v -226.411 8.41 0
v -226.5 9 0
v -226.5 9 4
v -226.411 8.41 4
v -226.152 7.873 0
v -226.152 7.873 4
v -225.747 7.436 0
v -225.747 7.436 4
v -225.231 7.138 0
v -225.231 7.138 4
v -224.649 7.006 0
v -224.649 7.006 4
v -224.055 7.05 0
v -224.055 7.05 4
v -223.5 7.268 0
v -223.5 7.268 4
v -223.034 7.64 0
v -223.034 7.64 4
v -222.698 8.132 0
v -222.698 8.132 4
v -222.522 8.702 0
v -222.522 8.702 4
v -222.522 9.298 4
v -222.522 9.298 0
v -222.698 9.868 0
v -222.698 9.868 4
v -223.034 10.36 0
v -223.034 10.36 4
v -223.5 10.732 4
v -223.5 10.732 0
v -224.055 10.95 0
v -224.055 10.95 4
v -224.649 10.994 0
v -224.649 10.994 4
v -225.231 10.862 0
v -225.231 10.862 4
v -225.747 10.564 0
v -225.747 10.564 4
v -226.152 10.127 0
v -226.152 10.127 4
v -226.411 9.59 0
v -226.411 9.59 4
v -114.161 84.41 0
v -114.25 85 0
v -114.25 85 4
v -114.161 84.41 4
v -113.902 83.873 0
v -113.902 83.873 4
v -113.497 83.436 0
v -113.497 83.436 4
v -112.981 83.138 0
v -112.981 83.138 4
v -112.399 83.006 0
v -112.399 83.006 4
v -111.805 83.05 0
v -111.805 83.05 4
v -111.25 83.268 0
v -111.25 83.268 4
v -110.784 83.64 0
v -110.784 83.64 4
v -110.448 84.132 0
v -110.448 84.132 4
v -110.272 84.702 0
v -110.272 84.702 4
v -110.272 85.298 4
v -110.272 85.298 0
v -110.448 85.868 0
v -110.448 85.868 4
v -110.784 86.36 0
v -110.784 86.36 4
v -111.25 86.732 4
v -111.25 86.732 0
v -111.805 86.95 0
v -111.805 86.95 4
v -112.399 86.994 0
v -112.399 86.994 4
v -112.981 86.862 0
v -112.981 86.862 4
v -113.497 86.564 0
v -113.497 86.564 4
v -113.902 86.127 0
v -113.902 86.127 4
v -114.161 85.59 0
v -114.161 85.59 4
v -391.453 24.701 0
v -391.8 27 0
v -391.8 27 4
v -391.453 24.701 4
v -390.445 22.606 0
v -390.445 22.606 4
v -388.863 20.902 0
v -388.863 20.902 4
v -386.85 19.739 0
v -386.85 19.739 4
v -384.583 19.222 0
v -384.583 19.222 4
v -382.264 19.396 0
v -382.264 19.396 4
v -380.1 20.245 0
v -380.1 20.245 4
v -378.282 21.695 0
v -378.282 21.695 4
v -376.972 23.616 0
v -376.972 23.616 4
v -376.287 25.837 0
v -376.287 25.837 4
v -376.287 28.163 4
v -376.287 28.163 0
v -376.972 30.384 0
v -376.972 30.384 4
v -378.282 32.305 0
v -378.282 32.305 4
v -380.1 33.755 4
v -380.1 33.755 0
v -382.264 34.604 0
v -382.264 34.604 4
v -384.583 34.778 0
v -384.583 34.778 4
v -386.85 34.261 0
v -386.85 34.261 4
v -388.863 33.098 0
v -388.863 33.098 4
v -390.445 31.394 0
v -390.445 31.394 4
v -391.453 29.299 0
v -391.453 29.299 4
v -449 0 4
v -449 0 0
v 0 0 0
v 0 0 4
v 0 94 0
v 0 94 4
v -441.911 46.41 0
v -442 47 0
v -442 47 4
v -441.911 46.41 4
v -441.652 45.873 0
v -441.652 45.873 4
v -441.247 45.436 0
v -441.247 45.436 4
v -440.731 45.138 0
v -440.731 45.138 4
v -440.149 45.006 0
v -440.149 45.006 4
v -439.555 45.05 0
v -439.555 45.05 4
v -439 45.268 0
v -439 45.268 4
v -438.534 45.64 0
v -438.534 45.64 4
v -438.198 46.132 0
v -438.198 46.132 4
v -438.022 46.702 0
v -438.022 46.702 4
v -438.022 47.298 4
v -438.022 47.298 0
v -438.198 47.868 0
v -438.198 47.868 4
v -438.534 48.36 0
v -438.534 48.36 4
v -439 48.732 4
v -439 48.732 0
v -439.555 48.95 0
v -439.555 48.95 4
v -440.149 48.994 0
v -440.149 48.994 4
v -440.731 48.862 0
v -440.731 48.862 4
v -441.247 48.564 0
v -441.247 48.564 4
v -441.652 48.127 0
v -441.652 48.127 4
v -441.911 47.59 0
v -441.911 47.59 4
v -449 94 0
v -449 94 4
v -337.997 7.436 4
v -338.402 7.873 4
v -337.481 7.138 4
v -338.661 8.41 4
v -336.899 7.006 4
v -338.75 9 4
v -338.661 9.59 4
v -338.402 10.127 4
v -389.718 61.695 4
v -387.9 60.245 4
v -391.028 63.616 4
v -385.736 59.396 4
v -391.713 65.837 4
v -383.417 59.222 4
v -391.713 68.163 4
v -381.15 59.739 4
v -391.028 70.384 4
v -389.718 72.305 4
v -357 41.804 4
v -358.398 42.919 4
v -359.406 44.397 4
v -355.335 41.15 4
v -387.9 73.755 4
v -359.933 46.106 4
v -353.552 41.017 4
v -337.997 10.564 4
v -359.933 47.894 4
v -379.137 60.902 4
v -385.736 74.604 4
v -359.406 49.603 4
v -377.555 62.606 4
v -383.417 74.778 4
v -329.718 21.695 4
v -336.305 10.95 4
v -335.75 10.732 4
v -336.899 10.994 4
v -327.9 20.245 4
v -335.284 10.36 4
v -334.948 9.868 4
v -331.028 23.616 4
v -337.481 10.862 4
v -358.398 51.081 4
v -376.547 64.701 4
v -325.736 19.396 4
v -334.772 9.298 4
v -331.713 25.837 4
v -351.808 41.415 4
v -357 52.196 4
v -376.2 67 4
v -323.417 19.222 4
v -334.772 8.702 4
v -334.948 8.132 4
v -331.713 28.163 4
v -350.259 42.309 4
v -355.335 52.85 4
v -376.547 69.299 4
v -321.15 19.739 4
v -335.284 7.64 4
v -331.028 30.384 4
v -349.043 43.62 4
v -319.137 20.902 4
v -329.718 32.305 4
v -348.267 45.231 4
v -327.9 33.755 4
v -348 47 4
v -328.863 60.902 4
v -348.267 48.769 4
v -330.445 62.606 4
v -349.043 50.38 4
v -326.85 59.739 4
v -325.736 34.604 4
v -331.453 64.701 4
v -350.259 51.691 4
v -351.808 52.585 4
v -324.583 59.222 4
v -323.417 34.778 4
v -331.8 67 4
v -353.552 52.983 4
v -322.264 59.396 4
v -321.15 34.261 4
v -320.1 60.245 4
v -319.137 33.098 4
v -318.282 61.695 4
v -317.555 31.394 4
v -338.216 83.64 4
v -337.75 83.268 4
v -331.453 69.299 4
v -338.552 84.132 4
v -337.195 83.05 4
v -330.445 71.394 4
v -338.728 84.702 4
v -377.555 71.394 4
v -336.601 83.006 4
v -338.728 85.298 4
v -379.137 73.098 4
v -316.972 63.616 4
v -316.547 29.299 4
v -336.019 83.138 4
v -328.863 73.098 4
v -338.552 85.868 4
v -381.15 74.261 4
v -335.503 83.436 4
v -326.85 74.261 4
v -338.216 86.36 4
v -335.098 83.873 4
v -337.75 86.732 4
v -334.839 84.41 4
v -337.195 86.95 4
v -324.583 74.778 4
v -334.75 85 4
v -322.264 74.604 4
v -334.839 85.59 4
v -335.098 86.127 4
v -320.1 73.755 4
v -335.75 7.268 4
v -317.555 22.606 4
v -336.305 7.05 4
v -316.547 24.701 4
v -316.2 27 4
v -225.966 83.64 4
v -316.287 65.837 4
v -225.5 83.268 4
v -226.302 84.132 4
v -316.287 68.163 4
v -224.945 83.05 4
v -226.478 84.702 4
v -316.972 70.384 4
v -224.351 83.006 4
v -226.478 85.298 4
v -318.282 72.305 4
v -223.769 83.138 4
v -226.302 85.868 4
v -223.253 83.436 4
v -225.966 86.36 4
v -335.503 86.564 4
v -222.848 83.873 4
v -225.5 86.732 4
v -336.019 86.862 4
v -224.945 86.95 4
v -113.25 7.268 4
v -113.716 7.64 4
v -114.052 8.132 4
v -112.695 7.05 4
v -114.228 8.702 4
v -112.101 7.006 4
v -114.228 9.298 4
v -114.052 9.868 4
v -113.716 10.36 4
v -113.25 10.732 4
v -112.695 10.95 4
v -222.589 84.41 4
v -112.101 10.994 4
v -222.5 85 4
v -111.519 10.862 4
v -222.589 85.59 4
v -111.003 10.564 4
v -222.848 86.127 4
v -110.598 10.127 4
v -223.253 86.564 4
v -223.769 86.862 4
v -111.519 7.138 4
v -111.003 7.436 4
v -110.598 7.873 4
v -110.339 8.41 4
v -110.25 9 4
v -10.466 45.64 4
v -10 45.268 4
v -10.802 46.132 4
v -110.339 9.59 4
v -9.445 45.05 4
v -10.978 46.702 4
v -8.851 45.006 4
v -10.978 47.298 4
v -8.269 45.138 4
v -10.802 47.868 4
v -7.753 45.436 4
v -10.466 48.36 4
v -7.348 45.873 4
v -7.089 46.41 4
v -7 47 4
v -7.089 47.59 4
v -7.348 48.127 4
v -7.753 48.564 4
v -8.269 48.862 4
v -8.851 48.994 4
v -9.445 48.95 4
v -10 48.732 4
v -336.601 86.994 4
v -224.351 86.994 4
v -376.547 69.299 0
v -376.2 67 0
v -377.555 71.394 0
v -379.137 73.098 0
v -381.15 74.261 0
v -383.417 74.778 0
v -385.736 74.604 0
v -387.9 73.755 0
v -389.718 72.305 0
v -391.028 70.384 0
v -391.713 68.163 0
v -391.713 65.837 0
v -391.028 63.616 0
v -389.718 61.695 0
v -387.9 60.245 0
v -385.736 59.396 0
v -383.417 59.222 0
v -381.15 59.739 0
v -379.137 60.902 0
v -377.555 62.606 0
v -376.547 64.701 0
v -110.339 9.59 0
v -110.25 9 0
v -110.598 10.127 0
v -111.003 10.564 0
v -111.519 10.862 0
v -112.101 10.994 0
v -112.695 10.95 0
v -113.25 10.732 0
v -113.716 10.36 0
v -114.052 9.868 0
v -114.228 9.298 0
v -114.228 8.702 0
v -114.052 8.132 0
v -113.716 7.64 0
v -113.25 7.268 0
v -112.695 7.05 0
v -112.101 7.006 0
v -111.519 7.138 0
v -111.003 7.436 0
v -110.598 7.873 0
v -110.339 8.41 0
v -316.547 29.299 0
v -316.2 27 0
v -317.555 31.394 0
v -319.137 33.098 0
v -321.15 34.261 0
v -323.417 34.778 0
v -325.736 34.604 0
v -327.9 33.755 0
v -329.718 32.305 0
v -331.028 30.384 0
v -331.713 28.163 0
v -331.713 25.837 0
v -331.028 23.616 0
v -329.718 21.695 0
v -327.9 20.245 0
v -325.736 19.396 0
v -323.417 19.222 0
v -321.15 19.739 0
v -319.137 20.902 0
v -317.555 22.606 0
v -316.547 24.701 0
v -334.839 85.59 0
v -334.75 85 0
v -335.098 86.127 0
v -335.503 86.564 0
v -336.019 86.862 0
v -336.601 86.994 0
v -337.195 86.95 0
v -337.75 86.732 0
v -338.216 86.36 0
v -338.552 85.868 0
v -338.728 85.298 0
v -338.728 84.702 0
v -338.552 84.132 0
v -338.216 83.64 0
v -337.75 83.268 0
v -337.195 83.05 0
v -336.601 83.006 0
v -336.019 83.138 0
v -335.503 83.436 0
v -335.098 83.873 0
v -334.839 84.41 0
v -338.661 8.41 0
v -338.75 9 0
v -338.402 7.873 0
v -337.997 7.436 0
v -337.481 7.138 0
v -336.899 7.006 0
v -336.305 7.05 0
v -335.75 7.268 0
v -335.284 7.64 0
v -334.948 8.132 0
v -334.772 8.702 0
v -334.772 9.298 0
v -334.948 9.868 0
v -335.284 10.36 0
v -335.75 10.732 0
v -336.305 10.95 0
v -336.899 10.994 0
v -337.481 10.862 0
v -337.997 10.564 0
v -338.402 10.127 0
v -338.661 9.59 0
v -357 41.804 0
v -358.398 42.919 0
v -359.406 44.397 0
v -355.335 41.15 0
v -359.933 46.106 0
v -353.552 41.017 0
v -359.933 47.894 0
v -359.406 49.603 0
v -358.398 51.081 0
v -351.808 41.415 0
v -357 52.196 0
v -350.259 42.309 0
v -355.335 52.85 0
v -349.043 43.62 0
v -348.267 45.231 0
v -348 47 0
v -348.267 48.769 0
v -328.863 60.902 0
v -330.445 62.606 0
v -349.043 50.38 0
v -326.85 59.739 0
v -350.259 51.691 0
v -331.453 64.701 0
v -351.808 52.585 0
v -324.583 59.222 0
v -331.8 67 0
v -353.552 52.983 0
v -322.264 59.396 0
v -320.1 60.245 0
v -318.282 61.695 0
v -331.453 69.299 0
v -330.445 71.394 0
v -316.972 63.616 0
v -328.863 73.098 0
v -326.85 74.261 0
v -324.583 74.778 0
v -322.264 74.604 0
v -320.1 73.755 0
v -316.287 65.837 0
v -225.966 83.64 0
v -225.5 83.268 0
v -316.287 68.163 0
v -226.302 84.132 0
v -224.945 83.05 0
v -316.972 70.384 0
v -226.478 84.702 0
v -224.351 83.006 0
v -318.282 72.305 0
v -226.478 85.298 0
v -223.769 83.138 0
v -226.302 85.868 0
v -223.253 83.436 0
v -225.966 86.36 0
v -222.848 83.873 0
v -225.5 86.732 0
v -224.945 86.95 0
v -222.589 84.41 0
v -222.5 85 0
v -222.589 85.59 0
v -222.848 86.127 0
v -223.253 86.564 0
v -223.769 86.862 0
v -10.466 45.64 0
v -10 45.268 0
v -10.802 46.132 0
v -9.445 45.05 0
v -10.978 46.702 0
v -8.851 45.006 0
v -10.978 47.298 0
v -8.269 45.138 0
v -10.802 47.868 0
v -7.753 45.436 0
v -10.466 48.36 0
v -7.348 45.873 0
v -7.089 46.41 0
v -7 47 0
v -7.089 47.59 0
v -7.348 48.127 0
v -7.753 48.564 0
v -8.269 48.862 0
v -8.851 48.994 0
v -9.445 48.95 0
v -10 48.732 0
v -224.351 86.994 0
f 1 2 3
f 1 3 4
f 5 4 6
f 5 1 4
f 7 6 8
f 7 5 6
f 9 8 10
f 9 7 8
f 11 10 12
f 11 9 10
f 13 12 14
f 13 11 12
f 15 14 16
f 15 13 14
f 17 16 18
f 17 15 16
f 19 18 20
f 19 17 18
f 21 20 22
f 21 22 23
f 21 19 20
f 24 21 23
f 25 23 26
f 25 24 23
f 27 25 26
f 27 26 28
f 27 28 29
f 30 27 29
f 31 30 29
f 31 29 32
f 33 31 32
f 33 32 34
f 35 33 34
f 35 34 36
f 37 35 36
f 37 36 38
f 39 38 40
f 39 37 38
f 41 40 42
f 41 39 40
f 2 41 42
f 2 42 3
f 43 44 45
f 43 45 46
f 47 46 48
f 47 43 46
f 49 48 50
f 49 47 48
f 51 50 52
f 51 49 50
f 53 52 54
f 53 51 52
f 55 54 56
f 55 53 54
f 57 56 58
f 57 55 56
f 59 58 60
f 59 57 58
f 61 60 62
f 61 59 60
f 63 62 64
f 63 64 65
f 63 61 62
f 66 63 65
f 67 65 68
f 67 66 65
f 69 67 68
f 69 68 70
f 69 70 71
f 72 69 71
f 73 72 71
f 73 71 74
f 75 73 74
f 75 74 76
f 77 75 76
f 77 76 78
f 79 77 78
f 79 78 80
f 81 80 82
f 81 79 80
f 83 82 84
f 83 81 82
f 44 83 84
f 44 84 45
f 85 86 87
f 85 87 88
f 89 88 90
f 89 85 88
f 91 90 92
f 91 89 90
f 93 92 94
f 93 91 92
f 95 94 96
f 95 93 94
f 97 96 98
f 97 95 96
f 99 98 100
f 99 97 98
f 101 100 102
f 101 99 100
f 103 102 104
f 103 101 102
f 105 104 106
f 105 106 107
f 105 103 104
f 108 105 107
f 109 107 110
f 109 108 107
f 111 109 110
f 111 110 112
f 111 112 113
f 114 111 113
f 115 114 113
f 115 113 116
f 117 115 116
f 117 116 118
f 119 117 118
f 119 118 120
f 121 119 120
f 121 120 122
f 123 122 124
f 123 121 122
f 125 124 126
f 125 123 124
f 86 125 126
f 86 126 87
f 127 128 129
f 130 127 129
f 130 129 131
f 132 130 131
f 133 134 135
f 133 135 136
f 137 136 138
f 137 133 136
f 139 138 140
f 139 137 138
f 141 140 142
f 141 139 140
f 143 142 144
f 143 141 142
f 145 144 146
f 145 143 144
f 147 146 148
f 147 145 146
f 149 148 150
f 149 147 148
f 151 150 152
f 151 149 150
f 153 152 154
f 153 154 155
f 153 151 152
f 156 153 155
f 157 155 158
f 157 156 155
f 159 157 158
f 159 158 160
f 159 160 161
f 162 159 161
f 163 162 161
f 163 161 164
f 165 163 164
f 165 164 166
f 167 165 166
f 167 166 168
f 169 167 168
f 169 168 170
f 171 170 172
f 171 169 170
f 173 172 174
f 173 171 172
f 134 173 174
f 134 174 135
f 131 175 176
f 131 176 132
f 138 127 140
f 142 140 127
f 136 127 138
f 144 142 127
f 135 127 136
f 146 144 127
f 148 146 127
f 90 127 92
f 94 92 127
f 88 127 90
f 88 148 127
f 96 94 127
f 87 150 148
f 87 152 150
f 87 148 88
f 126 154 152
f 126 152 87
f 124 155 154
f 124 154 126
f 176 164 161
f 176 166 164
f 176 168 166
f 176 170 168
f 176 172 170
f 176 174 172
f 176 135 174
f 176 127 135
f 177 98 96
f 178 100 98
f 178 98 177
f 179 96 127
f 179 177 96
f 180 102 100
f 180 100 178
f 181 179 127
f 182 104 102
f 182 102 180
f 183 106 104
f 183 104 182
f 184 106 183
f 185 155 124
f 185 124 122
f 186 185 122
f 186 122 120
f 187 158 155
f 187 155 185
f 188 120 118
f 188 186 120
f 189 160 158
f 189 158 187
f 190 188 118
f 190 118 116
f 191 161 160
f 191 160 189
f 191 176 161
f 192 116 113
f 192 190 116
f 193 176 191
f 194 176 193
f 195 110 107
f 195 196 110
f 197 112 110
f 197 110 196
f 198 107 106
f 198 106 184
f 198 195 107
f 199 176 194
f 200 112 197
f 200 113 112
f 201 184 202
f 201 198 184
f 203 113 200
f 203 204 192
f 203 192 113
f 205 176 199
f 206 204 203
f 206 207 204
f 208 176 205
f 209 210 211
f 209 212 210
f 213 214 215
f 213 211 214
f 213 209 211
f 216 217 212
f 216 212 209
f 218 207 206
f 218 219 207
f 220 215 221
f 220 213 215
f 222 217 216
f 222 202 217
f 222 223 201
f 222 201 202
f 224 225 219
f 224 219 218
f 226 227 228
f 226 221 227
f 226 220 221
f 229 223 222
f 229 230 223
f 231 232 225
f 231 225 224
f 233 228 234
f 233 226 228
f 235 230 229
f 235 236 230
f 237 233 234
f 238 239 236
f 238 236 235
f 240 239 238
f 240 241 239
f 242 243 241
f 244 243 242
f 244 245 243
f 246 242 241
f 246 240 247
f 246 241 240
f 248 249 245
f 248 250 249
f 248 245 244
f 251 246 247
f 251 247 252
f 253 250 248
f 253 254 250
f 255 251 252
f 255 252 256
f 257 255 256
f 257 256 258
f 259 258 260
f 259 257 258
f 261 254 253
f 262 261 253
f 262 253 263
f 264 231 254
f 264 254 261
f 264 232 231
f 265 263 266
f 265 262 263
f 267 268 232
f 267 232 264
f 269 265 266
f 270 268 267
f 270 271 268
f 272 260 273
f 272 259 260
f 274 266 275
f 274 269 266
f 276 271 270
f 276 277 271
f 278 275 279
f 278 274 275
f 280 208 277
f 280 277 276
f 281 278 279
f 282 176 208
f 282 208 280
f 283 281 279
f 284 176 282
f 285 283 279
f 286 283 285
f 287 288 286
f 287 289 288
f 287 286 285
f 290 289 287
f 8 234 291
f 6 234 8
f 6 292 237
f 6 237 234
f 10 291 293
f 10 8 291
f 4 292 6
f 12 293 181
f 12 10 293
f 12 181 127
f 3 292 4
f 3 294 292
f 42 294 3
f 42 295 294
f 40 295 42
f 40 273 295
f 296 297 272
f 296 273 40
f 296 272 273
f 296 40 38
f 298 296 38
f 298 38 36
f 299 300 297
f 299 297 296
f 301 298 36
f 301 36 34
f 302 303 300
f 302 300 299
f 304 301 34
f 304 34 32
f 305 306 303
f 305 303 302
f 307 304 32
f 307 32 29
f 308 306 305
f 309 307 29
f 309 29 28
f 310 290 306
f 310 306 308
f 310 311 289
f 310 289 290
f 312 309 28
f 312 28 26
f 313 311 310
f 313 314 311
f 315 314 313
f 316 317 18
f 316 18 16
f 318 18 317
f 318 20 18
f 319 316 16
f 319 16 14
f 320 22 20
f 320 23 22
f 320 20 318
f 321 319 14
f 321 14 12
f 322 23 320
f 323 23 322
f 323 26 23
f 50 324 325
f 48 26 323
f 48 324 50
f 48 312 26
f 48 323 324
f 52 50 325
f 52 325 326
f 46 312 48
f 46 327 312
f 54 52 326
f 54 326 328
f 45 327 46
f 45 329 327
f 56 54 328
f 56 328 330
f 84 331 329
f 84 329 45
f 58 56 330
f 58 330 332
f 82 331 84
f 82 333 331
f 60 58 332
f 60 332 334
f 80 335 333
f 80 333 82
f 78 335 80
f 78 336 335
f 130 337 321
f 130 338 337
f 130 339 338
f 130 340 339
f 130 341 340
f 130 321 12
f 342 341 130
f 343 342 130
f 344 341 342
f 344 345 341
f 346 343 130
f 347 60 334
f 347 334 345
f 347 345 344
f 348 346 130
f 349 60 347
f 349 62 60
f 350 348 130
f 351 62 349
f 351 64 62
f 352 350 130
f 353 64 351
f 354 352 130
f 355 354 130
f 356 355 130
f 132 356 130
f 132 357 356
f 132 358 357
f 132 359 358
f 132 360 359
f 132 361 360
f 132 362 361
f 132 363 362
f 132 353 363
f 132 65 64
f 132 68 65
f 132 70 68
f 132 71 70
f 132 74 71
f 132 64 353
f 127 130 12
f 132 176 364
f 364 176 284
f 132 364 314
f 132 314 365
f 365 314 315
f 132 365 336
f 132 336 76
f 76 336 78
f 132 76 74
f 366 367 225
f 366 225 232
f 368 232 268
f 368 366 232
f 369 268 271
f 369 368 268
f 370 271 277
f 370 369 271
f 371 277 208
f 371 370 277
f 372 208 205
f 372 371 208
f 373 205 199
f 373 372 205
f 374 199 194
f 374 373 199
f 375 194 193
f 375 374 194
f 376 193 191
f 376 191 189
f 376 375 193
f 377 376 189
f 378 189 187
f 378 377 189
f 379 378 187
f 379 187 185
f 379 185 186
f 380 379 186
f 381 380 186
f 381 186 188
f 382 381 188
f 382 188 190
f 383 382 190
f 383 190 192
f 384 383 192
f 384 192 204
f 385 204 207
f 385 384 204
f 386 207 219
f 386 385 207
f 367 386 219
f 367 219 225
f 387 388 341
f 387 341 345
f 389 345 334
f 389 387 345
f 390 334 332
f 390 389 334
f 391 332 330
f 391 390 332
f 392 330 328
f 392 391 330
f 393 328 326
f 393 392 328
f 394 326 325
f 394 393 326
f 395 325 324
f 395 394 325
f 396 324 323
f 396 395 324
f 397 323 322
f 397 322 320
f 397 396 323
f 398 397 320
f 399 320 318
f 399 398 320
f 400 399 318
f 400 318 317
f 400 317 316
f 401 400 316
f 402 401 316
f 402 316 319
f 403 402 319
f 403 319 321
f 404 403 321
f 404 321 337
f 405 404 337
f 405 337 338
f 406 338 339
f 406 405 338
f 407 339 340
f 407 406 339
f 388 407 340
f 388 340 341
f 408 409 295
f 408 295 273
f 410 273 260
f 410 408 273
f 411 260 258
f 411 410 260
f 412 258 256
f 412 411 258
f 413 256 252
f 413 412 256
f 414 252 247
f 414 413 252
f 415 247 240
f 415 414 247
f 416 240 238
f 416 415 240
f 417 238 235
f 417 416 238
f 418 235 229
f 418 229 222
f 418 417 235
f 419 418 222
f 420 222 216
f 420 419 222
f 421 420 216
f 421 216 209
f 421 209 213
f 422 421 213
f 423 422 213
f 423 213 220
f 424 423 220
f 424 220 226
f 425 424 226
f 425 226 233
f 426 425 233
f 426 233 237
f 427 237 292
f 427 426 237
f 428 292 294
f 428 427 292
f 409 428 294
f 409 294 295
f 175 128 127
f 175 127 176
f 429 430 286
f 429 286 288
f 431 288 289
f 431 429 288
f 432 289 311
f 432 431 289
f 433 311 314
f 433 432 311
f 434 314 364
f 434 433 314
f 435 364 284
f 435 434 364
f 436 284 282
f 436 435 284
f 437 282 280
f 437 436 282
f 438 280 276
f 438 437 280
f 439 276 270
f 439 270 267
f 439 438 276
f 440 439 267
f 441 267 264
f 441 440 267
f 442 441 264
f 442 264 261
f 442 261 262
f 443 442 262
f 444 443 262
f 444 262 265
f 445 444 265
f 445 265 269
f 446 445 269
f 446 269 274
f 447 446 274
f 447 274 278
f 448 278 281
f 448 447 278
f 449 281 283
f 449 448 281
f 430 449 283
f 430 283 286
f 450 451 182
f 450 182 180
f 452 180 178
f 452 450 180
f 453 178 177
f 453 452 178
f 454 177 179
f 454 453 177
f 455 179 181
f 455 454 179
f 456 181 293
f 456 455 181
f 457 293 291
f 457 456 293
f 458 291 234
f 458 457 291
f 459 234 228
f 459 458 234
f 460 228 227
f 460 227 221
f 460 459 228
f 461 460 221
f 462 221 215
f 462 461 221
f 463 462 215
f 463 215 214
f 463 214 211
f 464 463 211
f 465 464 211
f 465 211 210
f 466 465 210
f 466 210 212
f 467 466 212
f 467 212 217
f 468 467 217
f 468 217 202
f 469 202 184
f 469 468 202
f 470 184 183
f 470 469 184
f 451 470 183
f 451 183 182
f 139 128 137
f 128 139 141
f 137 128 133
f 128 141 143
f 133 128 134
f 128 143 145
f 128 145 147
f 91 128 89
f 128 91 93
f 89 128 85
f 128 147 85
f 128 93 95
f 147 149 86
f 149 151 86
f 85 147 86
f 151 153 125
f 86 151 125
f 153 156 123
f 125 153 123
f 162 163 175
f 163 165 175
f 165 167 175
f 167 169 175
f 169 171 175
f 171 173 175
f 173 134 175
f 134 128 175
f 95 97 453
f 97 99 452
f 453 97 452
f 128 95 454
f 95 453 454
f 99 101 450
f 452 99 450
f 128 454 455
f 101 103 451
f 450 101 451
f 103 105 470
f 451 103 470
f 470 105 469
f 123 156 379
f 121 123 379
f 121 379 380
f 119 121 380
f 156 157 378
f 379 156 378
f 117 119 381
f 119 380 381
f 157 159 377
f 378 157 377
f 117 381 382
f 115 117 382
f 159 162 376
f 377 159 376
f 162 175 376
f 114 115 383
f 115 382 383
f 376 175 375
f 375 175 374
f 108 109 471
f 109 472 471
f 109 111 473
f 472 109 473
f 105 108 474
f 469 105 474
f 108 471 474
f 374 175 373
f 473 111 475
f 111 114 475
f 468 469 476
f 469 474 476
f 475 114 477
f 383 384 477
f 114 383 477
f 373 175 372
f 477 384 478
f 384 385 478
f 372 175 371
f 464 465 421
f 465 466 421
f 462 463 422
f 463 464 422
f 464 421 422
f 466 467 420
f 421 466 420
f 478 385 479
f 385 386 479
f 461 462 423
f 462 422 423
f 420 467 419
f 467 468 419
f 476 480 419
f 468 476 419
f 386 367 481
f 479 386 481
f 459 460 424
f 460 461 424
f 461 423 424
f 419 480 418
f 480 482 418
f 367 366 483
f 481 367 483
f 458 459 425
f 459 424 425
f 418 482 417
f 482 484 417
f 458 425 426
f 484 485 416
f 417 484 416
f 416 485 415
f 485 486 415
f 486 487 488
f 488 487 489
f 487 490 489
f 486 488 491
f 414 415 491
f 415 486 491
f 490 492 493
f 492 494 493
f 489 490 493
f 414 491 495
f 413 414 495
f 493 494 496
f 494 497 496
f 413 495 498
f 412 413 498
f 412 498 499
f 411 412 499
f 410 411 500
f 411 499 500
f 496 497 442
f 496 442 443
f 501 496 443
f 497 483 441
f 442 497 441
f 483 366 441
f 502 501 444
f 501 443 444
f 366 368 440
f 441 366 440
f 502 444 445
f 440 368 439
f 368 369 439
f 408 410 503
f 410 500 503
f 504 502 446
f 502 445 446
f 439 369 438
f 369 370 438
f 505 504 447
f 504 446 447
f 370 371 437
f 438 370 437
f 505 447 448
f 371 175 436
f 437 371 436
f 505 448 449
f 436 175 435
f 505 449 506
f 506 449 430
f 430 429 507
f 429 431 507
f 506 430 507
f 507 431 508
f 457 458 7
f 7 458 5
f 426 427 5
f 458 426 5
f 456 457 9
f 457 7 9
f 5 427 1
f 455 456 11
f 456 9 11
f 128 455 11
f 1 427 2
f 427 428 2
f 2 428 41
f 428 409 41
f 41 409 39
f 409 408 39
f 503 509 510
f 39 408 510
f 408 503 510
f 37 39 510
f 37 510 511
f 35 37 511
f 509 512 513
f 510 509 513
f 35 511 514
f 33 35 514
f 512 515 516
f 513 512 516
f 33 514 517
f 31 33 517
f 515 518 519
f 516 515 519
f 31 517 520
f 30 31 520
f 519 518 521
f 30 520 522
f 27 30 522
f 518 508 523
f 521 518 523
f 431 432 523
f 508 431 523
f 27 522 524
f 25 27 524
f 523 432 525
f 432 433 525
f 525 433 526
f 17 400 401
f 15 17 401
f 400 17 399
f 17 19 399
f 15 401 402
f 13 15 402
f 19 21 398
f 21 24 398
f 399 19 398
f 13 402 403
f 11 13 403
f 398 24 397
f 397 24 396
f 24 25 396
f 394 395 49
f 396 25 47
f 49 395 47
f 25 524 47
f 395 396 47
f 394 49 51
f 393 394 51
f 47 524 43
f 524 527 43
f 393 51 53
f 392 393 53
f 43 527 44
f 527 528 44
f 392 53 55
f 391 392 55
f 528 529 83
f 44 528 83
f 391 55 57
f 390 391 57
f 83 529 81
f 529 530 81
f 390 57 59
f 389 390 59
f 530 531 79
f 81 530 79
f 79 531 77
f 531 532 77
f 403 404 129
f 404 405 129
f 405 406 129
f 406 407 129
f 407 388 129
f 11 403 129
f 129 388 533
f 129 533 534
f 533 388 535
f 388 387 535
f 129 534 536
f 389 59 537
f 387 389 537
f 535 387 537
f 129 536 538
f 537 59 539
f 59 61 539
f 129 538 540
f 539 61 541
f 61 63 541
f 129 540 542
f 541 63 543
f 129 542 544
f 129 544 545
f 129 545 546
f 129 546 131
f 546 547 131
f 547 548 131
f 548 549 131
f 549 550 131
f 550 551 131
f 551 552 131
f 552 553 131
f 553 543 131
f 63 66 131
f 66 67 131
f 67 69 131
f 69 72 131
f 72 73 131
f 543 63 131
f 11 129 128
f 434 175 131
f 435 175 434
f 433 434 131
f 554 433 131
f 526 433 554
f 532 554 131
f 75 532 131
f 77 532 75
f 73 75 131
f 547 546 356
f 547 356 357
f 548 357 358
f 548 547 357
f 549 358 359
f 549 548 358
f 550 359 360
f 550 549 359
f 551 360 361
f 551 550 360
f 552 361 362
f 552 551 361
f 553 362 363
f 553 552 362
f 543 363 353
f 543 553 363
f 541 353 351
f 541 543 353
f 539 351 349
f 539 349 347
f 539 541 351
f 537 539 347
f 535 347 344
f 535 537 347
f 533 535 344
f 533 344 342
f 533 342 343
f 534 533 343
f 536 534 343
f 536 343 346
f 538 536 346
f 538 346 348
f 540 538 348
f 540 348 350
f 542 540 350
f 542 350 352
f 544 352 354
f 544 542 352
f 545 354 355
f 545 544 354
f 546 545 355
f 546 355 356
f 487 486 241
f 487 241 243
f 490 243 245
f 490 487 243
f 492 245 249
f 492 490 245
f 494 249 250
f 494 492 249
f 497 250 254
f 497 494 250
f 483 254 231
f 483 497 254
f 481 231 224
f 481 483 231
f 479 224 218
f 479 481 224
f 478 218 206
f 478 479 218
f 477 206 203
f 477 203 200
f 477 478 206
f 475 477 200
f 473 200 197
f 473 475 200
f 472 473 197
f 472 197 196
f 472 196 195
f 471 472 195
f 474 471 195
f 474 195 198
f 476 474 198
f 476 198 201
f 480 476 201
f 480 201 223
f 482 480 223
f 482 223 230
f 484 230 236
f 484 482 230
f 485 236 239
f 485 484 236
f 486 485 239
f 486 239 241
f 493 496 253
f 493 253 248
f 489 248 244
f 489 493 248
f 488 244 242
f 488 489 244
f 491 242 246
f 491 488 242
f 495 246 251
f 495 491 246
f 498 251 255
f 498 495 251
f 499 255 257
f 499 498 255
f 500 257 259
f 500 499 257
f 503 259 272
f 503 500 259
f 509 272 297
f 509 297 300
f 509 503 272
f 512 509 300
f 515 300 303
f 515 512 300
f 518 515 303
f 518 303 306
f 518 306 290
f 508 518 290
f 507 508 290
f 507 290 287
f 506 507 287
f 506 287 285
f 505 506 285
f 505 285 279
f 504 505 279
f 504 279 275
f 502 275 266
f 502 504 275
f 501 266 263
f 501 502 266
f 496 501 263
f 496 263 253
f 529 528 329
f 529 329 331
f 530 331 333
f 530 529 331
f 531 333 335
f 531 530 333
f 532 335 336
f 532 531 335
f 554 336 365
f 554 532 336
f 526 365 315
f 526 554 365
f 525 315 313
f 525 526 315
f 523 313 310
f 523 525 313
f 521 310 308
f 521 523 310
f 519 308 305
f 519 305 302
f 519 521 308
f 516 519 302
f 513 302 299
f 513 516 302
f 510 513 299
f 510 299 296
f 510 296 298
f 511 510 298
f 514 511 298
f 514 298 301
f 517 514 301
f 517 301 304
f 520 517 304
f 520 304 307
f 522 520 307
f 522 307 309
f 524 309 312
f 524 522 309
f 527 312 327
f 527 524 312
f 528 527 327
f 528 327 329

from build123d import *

# Parameters (mm, degrees)
SCHIZZO1_W                   = 449
SCHIZZO1_H                   = 94
SCHIZZO1_R                   = 7.8
SCHIZZO1_R_2                 = 2
SCHIZZO1_R_3                 = 6
ESTRUSIONE_ESTRUSIONE1_DEPTH = 4


with BuildPart() as part:
    # Schizzo1 → Estrusione-Estrusione1 (new body)
    with BuildSketch(Plane.XY):
        with Locations((-224.5, 47)):
            Rectangle(SCHIZZO1_W, SCHIZZO1_H)
        with Locations(Location((-384, 27, 0), (0, 0, 180))):
            Circle(SCHIZZO1_R, mode=Mode.SUBTRACT)
        with Locations((-9, 47)):
            Circle(SCHIZZO1_R_2, mode=Mode.SUBTRACT)
        with Locations((-224.5, 85)):
            Circle(SCHIZZO1_R_2, mode=Mode.SUBTRACT)
        with Locations(Location((-440, 47, 0), (0, 0, 180))):
            Circle(SCHIZZO1_R_2, mode=Mode.SUBTRACT)
        with Locations(Location((-224.5, 9, 0), (0, 0, 180))):
            Circle(SCHIZZO1_R_2, mode=Mode.SUBTRACT)
        with Locations((-324, 27)):
            Circle(SCHIZZO1_R, mode=Mode.SUBTRACT)
        with Locations(Location((-324, 67, 0), (0, 0, 180))):
            Circle(SCHIZZO1_R, mode=Mode.SUBTRACT)
        with Locations((-336.75, 85)):
            Circle(SCHIZZO1_R_2, mode=Mode.SUBTRACT)
        with Locations((-384, 67)):
            Circle(SCHIZZO1_R, mode=Mode.SUBTRACT)
        with Locations(Location((-336.75, 9, 0), (0, 0, 180))):
            Circle(SCHIZZO1_R_2, mode=Mode.SUBTRACT)
        with Locations((-112.25, 9)):
            Circle(SCHIZZO1_R_2, mode=Mode.SUBTRACT)
        with Locations(Location((-112.25, 85, 0), (0, 0, 180))):
            Circle(SCHIZZO1_R_2, mode=Mode.SUBTRACT)
        with Locations((-354, 47)):
            Circle(SCHIZZO1_R_3, mode=Mode.SUBTRACT)
    extrude(amount=ESTRUSIONE_ESTRUSIONE1_DEPTH)


solid = part.part
